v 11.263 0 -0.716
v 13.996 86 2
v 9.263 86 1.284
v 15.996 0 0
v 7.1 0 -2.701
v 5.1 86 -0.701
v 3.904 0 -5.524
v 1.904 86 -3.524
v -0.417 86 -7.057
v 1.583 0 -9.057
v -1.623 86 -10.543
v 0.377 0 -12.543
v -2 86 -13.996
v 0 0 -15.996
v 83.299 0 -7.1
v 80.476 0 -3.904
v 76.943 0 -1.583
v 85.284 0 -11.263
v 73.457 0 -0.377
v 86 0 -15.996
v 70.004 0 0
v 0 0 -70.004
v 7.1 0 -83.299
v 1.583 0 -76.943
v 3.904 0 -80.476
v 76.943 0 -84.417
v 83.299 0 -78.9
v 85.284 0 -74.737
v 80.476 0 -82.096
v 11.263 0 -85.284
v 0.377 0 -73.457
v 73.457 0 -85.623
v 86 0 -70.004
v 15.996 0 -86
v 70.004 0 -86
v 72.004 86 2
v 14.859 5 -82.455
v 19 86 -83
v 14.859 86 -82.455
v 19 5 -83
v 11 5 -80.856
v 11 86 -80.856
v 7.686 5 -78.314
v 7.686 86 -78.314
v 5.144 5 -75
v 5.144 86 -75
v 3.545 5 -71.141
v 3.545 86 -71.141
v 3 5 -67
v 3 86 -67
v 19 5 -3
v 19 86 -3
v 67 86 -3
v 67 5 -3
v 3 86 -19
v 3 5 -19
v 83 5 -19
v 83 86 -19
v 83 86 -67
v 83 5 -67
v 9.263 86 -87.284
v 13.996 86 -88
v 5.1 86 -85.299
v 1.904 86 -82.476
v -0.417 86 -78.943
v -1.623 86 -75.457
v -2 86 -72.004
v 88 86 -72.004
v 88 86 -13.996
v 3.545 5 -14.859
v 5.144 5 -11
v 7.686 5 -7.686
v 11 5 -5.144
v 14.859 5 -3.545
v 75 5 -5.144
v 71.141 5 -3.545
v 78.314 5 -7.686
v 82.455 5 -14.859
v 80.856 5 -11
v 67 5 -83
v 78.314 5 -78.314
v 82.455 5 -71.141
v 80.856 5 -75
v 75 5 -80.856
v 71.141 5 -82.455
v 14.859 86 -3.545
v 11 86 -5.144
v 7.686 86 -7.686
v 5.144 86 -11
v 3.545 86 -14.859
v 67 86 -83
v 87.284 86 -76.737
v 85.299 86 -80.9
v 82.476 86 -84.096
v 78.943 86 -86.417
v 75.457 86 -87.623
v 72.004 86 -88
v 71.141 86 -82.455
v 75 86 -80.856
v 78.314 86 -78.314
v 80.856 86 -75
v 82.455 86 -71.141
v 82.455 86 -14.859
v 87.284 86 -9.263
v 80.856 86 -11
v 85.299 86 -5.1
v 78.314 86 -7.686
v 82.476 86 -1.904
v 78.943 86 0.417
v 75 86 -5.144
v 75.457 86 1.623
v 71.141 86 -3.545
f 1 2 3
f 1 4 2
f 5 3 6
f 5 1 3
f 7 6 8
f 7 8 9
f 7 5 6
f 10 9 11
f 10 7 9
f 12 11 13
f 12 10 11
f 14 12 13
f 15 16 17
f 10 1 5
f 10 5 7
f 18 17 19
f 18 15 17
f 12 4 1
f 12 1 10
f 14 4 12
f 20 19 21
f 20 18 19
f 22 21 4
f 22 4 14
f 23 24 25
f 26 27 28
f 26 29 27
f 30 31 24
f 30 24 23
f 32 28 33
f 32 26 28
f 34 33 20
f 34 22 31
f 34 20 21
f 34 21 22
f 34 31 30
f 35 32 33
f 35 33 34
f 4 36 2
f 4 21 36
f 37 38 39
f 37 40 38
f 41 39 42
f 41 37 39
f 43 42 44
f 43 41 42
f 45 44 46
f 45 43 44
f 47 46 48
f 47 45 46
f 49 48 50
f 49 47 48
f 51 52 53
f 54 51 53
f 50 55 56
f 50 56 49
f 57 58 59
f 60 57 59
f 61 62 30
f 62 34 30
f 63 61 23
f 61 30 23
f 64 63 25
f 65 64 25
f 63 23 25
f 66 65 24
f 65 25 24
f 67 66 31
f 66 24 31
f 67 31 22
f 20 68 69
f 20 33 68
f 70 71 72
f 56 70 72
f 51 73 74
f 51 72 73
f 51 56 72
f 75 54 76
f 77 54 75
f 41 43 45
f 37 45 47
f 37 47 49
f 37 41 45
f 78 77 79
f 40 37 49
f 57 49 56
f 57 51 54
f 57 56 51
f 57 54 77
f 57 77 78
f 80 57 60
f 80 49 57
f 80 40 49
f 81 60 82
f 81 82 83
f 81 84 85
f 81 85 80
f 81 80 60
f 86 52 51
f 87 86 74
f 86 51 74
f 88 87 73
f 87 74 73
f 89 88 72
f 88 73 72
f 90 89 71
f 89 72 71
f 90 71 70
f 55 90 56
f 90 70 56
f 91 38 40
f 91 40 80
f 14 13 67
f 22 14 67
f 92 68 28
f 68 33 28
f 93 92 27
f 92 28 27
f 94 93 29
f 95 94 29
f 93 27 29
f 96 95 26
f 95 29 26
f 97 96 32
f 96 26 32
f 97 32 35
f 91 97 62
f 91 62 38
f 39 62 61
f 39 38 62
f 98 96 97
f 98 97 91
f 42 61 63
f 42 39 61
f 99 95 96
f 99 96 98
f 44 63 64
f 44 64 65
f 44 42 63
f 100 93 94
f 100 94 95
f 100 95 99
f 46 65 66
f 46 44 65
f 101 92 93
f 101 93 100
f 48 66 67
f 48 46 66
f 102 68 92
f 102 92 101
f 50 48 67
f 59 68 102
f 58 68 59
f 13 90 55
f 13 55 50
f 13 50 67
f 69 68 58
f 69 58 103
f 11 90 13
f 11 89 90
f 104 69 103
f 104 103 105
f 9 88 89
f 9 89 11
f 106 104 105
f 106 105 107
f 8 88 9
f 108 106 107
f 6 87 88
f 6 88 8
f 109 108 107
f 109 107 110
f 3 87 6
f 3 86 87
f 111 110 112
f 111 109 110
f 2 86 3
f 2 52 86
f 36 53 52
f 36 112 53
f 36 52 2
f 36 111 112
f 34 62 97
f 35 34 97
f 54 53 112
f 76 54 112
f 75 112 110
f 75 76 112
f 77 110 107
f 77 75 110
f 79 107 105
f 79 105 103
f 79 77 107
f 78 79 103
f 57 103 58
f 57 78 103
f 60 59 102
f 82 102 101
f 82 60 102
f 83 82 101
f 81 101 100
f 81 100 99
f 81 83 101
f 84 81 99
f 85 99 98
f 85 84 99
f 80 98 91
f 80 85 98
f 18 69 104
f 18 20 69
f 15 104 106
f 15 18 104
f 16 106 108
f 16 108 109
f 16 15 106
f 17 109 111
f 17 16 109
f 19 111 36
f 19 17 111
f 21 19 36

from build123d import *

# Parameters (mm, degrees)
SKETCH5_W          = 80
SKETCH5_H          = 80
CUT_EXTRUDE1_DEPTH = 81
FILLET1_R          = 16


with BuildPart() as part:
    # Sketch4 → Loft1 section 0
    with BuildSketch(Plane(origin=(0, 86, -86), x_dir=(1, 0, 0), z_dir=(0, 1, 0))):
        with BuildLine():
            Line((88, 2), (88, -88))
            Line((88, -88), (-2, -88))
            Line((-2, -88), (-2, 2))
            Line((-2, 2), (88, 2))
        make_face()
    # Sketch2 → Loft1 section 1
    with BuildSketch(Plane(origin=(0, 0, 0), x_dir=(1, 0, 0), z_dir=(0, 1, 0))):
        with BuildLine():
            Line((0, 0), (86, 0))
            Line((86, 0), (86, 86))
            Line((86, 86), (0, 86))
            Line((0, 86), (0, 0))
        make_face()
    loft()

    # Sketch5 → Cut-Extrude1 (cut)
    with BuildSketch(Plane(origin=(0, 86, 0), x_dir=(1, 0, 0), z_dir=(0, 1, 0))):
        with Locations((43, 43)):
            Rectangle(SKETCH5_W, SKETCH5_H)
    extrude(amount=-CUT_EXTRUDE1_DEPTH, mode=Mode.SUBTRACT)

    # Fillet1
    fillet1_edges = [part.edges().sort_by_distance(p)[0] for p in [
        (87, 43, -87),
        (83, 45.5, -83),
        (87, 43, 1),
        (83, 45.5, -3),
        (-1, 43, 1),
        (3, 45.5, -3),
        (-1, 43, -87),
        (3, 45.5, -83),
    ]]
    fillet(fillet1_edges, radius=FILLET1_R)


solid = part.part
